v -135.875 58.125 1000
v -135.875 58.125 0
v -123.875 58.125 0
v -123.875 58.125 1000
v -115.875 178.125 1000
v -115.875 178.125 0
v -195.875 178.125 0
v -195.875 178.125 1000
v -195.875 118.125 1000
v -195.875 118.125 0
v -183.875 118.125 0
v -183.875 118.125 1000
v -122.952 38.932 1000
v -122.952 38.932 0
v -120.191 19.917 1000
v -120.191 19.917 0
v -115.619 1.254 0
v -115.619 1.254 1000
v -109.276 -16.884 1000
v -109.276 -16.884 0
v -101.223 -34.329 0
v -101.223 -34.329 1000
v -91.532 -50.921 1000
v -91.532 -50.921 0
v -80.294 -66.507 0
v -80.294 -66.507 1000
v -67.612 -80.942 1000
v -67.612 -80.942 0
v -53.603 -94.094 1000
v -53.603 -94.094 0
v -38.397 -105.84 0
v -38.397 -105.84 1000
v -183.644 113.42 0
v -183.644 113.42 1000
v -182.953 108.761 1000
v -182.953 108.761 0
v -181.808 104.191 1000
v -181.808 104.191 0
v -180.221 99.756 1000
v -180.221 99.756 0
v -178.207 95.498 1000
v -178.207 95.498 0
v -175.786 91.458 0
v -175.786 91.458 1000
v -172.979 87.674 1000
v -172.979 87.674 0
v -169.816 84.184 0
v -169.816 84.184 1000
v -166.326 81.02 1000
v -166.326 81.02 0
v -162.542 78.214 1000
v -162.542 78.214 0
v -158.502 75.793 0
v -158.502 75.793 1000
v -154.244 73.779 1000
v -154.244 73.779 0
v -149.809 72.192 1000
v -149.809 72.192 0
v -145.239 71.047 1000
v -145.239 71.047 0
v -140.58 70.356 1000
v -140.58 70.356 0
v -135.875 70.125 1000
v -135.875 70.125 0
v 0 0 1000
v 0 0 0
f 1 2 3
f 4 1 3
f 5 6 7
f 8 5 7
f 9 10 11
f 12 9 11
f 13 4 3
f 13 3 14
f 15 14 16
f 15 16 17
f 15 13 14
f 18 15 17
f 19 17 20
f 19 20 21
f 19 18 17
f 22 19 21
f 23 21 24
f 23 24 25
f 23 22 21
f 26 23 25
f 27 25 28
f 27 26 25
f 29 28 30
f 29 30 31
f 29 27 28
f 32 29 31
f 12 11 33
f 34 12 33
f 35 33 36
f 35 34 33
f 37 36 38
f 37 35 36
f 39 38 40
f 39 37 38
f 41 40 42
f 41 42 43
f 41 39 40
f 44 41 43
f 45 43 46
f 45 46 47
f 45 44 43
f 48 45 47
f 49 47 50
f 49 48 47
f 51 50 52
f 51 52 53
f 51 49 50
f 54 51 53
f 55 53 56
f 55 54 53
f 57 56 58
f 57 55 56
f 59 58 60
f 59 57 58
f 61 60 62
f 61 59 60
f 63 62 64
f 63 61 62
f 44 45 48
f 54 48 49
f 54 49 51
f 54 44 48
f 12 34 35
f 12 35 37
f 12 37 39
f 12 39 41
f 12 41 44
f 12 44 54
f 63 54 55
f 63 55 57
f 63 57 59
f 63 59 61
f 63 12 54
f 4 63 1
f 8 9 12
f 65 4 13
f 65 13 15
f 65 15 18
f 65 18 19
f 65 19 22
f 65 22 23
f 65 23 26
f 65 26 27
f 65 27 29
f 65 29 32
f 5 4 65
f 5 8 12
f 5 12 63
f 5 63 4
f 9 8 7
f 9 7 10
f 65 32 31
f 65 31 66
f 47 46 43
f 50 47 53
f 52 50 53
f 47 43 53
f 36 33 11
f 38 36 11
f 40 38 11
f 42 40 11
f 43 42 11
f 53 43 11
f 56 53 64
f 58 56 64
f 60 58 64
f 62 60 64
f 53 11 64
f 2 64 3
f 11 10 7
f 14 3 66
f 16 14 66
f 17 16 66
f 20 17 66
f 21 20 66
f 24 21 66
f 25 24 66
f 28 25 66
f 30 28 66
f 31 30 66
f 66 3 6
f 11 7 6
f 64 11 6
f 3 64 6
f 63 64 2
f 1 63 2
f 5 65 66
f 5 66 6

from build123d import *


with BuildPart() as f3:
    # F3: sweep along a path in F2
    with BuildLine(Plane.XZ.offset(105.8403934839)) as f3_path:
        Line((-38.3972818889, 0), (-38.3972818889, 1000))
    # F0 (on Top) → F3 (sweep)
    with BuildSketch(Plane.XY):
        with BuildLine():
            Line((-38.3972818889, -105.8403934839), (0, 0))
            Line((0, 0), (-115.8749862256, 178.1249802876))
            Line((-115.8749862256, 178.1249802876), (-195.8749862256, 178.1249802876))
            Line((-195.8749862256, 178.1249802876), (-195.8749862256, 118.1249802876))
            Line((-195.8749862256, 118.1249802876), (-183.8749862256, 118.1249802876))
            ThreePointArc((-183.8749862256, 118.1249802876), (-169.8161117226, 84.1838547906), (-135.8749862256, 70.1249802876))
            Line((-135.8749862256, 70.1249802876), (-135.8749862256, 58.1249802876))
            Line((-135.8749862256, 58.1249802876), (-123.8749862256, 58.1249802876))
            ThreePointArc((-123.8749862256, 58.1249802876), (-101.2227507064, -34.329172857), (-38.3972818889, -105.8403934839))
        make_face()
    sweep(path=f3_path.line)


solid = f3.part
